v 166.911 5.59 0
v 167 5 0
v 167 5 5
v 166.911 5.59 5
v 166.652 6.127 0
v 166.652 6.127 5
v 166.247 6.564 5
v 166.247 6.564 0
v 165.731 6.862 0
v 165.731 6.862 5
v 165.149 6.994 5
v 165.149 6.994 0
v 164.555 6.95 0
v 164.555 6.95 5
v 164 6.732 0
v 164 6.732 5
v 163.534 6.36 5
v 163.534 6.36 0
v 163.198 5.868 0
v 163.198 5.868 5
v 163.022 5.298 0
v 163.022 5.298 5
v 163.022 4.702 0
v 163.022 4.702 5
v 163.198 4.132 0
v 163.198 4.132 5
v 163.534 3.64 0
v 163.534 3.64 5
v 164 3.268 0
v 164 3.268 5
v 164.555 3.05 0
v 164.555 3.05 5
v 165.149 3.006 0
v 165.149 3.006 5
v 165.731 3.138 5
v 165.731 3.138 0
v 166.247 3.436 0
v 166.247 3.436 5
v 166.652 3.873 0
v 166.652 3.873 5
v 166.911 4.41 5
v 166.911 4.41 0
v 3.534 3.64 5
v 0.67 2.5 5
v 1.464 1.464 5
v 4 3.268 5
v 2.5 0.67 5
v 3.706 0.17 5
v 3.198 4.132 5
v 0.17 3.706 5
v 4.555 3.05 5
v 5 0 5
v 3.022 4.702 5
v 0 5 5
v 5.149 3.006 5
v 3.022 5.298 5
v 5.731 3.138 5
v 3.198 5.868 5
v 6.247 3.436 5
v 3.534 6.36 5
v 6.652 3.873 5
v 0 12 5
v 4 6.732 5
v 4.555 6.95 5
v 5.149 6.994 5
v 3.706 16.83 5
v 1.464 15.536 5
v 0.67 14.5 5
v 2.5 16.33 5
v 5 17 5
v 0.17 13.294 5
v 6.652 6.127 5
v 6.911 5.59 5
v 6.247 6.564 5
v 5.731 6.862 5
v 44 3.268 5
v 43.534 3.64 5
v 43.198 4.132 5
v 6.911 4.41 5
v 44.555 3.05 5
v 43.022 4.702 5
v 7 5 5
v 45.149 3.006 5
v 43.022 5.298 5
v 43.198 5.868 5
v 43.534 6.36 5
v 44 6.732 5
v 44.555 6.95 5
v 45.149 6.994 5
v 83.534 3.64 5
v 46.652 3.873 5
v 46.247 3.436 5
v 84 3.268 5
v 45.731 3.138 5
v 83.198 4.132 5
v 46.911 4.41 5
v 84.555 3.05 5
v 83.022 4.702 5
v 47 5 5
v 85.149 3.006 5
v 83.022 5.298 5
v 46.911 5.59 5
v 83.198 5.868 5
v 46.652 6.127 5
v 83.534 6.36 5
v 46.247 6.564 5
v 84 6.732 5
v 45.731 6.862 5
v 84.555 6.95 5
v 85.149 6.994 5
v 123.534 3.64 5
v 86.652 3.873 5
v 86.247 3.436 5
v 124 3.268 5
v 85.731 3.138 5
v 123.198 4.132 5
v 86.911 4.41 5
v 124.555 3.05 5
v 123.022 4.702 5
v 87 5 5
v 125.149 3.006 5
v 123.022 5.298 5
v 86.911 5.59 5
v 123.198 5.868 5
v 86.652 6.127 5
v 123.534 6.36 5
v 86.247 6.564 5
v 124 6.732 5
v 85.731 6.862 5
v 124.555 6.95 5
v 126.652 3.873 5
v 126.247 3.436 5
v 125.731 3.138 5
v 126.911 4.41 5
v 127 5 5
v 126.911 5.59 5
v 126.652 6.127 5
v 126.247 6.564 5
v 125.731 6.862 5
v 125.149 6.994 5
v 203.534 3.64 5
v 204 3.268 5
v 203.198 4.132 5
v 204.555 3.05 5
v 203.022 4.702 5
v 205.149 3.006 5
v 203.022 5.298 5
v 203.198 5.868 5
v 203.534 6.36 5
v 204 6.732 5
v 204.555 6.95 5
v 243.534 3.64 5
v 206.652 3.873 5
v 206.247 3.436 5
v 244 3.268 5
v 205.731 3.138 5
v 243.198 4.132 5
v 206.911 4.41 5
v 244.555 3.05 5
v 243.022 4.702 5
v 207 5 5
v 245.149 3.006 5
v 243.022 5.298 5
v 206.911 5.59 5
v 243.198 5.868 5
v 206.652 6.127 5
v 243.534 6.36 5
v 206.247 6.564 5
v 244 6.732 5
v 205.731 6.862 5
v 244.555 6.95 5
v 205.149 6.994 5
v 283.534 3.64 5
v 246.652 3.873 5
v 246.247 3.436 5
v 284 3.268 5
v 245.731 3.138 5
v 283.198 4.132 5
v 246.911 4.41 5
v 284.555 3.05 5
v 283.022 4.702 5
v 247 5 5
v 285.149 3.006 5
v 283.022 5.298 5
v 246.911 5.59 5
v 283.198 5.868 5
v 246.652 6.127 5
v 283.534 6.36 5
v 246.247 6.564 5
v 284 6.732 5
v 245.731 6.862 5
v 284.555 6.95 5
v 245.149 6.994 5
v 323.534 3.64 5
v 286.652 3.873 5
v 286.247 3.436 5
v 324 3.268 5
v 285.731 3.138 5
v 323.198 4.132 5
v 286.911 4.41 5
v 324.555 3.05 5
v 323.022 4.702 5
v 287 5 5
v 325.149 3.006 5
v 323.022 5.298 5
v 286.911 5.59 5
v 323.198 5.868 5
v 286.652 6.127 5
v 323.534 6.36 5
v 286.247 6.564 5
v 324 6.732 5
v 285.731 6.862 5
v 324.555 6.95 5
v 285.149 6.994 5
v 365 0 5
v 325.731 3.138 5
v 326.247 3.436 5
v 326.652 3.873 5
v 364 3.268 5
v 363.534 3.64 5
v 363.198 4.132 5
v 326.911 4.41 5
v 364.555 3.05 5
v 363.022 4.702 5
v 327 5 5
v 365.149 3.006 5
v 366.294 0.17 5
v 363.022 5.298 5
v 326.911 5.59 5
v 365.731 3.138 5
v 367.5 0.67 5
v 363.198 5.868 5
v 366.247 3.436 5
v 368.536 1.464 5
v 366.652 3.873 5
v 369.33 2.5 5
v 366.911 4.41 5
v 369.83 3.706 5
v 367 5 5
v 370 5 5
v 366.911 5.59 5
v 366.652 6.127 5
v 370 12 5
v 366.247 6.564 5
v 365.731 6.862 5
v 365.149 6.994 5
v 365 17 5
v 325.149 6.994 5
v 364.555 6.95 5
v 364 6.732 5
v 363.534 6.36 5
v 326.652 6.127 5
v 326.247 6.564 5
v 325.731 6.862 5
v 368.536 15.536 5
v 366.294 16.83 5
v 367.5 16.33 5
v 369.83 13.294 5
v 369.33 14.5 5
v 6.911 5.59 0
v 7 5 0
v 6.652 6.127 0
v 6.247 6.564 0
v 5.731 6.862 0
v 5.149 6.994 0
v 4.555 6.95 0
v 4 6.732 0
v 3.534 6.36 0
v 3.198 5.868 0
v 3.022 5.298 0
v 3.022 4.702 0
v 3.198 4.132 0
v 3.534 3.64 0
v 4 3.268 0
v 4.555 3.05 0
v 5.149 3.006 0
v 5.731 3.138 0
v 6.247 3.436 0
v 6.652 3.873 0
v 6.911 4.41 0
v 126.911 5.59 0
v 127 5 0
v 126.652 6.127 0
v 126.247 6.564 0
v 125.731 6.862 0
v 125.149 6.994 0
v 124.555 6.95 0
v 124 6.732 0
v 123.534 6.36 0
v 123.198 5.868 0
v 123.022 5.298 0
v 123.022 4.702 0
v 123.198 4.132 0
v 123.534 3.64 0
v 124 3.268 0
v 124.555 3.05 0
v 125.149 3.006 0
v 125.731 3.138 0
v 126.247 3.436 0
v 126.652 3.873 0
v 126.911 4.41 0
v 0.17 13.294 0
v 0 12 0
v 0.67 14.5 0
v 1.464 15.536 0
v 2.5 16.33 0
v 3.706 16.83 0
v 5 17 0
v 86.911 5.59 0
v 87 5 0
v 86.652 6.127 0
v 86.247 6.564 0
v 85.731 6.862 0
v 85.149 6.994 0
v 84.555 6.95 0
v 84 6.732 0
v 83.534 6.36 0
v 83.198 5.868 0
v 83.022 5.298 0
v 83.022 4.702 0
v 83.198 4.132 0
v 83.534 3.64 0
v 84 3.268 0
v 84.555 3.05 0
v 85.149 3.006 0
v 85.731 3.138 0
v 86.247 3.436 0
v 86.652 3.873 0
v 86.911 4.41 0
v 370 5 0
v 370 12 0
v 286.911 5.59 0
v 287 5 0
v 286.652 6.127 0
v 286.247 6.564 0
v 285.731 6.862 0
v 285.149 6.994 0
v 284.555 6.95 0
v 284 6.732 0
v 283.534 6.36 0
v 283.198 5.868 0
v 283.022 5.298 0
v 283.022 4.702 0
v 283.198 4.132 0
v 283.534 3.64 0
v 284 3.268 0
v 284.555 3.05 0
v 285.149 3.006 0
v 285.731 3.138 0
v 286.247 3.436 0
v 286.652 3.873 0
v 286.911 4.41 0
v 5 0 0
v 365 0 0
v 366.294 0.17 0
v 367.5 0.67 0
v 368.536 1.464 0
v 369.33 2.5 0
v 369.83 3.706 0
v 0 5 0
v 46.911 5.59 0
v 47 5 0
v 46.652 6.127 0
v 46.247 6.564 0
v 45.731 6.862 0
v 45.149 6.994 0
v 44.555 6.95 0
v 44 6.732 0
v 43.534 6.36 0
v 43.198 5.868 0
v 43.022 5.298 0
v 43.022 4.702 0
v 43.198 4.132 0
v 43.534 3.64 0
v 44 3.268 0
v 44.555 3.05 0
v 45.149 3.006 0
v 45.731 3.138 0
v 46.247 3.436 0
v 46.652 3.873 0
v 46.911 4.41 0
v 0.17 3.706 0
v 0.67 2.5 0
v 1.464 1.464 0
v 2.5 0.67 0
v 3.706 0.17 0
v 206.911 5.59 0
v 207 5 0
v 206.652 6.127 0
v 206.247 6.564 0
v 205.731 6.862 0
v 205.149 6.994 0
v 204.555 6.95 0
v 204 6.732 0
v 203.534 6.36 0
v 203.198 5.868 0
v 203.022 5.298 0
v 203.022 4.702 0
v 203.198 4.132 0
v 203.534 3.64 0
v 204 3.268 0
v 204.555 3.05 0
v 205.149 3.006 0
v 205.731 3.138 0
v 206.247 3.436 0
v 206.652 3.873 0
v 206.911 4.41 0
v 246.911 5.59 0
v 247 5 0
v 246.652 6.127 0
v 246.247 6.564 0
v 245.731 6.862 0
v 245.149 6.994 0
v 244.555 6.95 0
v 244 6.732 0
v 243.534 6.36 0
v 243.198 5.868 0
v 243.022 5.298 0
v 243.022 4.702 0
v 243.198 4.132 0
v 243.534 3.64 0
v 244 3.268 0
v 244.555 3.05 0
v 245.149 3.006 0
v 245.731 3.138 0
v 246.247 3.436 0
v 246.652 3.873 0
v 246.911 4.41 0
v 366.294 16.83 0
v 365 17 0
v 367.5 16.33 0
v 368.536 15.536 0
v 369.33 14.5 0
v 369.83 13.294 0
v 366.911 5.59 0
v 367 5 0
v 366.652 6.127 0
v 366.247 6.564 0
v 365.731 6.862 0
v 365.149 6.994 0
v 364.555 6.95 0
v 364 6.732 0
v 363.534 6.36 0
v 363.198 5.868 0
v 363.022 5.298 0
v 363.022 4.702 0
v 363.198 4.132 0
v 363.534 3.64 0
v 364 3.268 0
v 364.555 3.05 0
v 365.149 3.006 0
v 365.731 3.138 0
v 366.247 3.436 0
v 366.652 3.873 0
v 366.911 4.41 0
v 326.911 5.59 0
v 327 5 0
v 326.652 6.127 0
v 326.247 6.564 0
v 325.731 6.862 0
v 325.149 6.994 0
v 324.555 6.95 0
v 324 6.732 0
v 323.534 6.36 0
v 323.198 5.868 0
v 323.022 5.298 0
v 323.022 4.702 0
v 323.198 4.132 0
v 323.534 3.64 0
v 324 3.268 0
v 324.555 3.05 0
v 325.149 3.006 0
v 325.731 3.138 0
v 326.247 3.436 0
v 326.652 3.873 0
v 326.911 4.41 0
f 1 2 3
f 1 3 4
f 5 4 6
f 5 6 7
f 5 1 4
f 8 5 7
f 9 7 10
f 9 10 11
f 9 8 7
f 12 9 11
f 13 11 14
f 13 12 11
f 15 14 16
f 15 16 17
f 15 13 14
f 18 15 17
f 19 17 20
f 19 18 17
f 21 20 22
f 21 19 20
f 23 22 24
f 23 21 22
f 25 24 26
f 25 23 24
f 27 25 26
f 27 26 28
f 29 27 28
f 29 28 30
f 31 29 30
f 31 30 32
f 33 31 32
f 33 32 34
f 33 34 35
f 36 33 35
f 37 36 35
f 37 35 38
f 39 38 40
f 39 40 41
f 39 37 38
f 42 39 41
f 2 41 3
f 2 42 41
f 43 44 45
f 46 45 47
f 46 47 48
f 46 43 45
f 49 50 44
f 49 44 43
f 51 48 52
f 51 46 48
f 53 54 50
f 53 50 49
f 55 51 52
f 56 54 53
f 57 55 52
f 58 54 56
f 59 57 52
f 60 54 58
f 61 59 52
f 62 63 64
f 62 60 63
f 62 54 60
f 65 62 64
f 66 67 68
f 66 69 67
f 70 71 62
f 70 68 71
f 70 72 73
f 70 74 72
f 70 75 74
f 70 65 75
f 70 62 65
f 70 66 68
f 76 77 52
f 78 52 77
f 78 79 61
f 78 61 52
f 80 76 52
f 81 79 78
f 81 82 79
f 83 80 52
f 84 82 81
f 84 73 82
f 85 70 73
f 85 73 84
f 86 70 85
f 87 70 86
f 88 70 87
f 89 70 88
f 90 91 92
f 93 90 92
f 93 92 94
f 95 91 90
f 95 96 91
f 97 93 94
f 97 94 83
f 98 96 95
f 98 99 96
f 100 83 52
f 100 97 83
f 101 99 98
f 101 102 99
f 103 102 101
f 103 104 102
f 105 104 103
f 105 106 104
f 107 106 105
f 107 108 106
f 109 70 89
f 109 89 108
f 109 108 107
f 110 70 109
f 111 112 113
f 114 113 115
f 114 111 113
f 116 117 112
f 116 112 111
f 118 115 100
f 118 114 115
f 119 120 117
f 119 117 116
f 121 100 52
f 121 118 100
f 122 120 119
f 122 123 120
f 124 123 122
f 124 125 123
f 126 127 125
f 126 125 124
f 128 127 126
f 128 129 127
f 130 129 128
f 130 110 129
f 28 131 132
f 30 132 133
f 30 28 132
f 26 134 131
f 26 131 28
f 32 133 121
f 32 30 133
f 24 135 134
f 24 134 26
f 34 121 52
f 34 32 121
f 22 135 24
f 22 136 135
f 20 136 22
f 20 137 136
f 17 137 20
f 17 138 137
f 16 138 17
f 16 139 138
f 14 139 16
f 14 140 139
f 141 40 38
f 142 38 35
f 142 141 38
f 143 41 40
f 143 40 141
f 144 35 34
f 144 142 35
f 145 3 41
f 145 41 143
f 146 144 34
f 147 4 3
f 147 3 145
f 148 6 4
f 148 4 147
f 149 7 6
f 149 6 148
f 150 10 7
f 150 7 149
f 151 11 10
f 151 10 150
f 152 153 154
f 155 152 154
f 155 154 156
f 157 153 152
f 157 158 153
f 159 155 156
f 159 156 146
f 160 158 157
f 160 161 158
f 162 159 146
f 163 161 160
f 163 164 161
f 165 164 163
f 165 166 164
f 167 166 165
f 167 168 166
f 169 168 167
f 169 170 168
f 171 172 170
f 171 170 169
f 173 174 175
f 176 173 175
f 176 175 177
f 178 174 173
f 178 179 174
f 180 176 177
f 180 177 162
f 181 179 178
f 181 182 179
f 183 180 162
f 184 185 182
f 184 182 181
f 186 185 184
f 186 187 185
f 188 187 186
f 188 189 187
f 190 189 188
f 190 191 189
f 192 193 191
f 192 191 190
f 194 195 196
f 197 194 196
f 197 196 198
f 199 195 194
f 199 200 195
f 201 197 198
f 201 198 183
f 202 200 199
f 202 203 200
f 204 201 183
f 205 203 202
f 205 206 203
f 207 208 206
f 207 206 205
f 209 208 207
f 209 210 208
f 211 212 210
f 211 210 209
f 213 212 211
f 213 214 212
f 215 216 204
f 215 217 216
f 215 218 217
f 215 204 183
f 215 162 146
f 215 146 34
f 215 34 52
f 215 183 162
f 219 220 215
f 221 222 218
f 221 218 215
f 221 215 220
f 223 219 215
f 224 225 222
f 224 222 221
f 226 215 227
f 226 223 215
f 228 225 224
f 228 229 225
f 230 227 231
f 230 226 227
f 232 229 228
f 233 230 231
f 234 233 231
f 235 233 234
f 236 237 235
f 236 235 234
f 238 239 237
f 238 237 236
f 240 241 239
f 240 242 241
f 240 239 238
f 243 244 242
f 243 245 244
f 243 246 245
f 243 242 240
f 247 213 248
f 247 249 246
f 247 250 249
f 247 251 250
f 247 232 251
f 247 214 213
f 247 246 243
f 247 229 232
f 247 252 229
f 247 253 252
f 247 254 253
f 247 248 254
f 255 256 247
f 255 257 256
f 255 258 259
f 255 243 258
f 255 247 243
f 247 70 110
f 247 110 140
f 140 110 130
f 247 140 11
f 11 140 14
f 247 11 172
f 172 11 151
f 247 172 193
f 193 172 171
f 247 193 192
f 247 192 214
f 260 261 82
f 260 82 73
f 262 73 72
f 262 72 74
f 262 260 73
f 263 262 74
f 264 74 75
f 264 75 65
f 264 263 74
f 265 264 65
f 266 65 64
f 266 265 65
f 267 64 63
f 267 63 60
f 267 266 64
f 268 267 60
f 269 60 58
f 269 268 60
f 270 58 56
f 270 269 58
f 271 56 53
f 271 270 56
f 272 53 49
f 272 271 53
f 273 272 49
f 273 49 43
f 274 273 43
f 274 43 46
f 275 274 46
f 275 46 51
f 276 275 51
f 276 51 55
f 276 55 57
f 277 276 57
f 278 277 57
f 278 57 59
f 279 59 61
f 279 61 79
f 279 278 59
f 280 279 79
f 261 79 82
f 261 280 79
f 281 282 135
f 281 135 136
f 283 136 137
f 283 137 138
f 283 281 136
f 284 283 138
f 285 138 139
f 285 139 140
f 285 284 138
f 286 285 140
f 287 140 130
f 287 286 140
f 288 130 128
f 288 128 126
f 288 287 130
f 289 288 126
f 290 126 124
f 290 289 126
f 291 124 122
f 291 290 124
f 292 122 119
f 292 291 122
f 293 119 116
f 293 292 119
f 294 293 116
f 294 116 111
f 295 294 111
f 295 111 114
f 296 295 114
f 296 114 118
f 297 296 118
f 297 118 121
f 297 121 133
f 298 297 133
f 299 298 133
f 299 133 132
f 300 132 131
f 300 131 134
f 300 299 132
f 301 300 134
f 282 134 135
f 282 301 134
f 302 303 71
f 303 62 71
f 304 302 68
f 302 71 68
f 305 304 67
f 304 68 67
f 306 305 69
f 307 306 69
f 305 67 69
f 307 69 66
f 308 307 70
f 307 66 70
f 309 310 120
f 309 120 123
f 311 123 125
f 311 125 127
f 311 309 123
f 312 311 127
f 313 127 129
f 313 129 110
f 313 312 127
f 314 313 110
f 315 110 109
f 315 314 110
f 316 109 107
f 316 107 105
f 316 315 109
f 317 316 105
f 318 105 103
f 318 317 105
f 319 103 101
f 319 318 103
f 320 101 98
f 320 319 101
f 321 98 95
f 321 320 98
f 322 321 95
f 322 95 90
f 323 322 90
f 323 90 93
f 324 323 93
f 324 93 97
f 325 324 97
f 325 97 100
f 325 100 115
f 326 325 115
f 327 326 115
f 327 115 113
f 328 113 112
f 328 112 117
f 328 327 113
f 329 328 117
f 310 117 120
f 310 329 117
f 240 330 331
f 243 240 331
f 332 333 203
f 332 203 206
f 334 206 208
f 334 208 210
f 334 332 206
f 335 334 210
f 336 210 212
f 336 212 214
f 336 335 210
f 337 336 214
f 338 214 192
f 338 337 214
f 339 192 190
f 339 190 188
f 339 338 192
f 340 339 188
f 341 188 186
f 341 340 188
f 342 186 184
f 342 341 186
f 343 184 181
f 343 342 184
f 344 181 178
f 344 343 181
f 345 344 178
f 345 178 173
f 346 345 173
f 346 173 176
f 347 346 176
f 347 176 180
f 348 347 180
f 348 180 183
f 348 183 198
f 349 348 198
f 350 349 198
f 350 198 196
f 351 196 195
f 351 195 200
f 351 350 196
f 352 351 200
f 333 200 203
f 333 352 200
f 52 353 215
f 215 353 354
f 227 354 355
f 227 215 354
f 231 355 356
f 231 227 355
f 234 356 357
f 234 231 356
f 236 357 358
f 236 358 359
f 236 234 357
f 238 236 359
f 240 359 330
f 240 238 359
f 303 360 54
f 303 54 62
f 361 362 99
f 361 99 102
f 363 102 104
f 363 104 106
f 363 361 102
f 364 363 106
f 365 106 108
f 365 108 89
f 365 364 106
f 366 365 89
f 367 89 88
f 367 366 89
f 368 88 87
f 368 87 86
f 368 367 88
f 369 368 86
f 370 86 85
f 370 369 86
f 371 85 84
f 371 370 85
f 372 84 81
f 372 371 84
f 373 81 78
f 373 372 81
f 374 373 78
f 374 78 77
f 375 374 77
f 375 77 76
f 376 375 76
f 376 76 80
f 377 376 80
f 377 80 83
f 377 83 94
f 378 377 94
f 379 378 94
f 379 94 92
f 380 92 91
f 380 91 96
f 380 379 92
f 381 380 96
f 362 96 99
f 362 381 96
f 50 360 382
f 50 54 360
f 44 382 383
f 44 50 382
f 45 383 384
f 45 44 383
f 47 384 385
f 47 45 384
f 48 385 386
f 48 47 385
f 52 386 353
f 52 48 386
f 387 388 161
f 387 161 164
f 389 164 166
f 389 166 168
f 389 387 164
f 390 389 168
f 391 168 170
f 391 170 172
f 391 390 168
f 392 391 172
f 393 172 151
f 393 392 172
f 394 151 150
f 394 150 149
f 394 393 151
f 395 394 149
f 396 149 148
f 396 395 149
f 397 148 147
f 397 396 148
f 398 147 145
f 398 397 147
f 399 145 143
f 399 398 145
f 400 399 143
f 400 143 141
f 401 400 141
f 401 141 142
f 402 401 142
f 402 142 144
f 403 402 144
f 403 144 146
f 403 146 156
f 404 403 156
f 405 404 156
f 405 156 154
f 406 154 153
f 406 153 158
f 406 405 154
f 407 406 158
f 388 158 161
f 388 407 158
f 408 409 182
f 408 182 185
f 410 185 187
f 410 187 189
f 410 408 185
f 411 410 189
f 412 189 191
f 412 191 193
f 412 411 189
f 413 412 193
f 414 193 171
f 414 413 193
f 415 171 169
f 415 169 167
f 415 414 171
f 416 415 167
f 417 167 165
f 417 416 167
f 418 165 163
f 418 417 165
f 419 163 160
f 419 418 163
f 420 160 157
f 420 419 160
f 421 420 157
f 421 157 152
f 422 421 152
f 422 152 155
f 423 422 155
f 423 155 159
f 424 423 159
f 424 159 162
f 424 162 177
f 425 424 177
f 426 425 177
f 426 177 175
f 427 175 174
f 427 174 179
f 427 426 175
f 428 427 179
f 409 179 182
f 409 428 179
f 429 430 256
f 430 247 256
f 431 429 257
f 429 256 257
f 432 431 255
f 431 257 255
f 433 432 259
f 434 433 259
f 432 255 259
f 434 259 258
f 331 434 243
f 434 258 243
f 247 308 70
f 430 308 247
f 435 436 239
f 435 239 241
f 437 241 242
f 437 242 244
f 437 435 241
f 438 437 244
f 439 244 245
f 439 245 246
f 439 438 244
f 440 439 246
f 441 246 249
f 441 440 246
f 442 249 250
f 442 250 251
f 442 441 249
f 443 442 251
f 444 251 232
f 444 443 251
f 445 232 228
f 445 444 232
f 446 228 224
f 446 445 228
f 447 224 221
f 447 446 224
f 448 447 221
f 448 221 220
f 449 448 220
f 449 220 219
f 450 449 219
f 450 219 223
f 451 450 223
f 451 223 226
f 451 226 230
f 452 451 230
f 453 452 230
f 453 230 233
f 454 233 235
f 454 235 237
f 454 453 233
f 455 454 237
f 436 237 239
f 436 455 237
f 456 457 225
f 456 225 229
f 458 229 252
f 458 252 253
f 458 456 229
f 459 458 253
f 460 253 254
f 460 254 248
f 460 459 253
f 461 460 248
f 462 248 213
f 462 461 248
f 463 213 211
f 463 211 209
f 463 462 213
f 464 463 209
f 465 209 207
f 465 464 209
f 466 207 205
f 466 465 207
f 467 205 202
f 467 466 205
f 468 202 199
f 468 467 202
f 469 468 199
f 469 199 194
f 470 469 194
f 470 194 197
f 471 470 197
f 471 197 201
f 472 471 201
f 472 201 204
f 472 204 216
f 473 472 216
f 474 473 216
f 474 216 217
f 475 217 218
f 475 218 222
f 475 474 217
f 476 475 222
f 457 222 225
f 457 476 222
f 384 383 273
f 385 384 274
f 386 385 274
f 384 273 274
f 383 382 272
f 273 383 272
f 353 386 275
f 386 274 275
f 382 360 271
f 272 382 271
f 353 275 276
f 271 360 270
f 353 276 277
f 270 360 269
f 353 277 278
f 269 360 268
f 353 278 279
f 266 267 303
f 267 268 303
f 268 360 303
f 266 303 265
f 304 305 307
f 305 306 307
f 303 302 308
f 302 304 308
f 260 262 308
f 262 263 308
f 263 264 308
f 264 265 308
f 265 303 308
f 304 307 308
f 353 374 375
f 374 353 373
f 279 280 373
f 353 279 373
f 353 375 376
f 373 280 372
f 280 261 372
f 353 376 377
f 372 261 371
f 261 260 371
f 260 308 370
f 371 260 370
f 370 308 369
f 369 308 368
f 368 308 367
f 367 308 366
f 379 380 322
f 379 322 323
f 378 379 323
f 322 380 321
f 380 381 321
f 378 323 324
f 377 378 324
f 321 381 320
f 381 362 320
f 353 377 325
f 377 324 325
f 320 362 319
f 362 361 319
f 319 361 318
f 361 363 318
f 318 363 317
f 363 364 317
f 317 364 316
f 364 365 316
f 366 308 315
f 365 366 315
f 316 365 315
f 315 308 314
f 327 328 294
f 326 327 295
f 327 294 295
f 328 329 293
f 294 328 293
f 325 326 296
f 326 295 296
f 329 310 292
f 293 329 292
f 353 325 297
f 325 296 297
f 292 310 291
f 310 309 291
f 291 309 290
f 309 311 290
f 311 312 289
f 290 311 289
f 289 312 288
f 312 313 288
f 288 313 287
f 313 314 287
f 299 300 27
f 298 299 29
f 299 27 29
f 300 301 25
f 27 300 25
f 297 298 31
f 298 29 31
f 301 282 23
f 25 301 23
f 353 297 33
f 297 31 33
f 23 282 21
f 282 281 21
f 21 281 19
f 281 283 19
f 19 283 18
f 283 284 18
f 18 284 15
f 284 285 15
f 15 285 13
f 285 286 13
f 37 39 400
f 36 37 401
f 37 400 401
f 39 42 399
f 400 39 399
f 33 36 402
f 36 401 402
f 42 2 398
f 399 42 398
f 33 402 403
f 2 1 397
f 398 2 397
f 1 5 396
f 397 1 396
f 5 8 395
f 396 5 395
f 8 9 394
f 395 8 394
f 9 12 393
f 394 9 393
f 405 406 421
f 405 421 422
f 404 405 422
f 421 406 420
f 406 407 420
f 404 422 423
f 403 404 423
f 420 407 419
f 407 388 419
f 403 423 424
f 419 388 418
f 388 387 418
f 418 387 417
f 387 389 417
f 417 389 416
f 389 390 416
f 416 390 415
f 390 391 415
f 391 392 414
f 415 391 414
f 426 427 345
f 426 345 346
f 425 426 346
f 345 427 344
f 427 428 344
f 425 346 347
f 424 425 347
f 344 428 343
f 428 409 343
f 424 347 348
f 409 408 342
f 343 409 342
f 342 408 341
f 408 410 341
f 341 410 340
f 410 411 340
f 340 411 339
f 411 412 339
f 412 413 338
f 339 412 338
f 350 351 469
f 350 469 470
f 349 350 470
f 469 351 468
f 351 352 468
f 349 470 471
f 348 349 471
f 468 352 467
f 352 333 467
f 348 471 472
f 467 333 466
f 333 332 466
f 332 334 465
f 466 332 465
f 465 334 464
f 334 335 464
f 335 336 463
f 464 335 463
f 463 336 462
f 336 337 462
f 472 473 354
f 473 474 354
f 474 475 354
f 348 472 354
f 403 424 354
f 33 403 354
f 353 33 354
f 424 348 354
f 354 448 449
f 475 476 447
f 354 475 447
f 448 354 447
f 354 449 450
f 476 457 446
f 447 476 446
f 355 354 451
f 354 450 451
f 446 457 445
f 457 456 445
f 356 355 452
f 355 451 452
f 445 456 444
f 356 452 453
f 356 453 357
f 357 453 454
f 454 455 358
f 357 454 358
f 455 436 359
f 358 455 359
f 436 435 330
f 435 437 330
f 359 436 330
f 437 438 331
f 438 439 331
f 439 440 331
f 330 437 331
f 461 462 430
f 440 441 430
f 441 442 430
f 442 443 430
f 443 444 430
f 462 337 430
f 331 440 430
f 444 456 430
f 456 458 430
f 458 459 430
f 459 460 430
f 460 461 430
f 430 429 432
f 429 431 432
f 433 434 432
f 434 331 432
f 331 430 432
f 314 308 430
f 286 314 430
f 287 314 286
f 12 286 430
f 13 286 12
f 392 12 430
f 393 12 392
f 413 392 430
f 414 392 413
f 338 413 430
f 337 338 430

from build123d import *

# Parameters (mm, degrees)
ESQUISSE1_W        = 370
ESQUISSE1_H        = 17
ESQUISSE1_R        = 2
BOSS_EXTRU_1_DEPTH = 5
CONG_1_R           = 5


with BuildPart() as part:
    # Esquisse1 → Boss.-Extru.1 (new body)
    with BuildSketch(Plane.XY):
        with Locations((185, 8.5)):
            Rectangle(ESQUISSE1_W, ESQUISSE1_H)
        with Locations((5, 5)):
            Circle(ESQUISSE1_R, mode=Mode.SUBTRACT)
        with Locations((45, 5)):
            Circle(ESQUISSE1_R, mode=Mode.SUBTRACT)
        with Locations((85, 5)):
            Circle(ESQUISSE1_R, mode=Mode.SUBTRACT)
        with Locations((125, 5)):
            Circle(ESQUISSE1_R, mode=Mode.SUBTRACT)
        with Locations((165, 5)):
            Circle(ESQUISSE1_R, mode=Mode.SUBTRACT)
        with Locations((205, 5)):
            Circle(ESQUISSE1_R, mode=Mode.SUBTRACT)
        with Locations((245, 5)):
            Circle(ESQUISSE1_R, mode=Mode.SUBTRACT)
        with Locations((285, 5)):
            Circle(ESQUISSE1_R, mode=Mode.SUBTRACT)
        with Locations((325, 5)):
            Circle(ESQUISSE1_R, mode=Mode.SUBTRACT)
        with Locations((365, 5)):
            Circle(ESQUISSE1_R, mode=Mode.SUBTRACT)
    extrude(amount=BOSS_EXTRU_1_DEPTH)

    # Congé1
    cong_1_edges = [part.edges().sort_by_distance(p)[0] for p in [
        (0, 17, 2.5),
        (370, 17, 2.5),
        (370, 0, 2.5),
        (0, 0, 2.5),
    ]]
    fillet(cong_1_edges, radius=CONG_1_R)


solid = part.part
